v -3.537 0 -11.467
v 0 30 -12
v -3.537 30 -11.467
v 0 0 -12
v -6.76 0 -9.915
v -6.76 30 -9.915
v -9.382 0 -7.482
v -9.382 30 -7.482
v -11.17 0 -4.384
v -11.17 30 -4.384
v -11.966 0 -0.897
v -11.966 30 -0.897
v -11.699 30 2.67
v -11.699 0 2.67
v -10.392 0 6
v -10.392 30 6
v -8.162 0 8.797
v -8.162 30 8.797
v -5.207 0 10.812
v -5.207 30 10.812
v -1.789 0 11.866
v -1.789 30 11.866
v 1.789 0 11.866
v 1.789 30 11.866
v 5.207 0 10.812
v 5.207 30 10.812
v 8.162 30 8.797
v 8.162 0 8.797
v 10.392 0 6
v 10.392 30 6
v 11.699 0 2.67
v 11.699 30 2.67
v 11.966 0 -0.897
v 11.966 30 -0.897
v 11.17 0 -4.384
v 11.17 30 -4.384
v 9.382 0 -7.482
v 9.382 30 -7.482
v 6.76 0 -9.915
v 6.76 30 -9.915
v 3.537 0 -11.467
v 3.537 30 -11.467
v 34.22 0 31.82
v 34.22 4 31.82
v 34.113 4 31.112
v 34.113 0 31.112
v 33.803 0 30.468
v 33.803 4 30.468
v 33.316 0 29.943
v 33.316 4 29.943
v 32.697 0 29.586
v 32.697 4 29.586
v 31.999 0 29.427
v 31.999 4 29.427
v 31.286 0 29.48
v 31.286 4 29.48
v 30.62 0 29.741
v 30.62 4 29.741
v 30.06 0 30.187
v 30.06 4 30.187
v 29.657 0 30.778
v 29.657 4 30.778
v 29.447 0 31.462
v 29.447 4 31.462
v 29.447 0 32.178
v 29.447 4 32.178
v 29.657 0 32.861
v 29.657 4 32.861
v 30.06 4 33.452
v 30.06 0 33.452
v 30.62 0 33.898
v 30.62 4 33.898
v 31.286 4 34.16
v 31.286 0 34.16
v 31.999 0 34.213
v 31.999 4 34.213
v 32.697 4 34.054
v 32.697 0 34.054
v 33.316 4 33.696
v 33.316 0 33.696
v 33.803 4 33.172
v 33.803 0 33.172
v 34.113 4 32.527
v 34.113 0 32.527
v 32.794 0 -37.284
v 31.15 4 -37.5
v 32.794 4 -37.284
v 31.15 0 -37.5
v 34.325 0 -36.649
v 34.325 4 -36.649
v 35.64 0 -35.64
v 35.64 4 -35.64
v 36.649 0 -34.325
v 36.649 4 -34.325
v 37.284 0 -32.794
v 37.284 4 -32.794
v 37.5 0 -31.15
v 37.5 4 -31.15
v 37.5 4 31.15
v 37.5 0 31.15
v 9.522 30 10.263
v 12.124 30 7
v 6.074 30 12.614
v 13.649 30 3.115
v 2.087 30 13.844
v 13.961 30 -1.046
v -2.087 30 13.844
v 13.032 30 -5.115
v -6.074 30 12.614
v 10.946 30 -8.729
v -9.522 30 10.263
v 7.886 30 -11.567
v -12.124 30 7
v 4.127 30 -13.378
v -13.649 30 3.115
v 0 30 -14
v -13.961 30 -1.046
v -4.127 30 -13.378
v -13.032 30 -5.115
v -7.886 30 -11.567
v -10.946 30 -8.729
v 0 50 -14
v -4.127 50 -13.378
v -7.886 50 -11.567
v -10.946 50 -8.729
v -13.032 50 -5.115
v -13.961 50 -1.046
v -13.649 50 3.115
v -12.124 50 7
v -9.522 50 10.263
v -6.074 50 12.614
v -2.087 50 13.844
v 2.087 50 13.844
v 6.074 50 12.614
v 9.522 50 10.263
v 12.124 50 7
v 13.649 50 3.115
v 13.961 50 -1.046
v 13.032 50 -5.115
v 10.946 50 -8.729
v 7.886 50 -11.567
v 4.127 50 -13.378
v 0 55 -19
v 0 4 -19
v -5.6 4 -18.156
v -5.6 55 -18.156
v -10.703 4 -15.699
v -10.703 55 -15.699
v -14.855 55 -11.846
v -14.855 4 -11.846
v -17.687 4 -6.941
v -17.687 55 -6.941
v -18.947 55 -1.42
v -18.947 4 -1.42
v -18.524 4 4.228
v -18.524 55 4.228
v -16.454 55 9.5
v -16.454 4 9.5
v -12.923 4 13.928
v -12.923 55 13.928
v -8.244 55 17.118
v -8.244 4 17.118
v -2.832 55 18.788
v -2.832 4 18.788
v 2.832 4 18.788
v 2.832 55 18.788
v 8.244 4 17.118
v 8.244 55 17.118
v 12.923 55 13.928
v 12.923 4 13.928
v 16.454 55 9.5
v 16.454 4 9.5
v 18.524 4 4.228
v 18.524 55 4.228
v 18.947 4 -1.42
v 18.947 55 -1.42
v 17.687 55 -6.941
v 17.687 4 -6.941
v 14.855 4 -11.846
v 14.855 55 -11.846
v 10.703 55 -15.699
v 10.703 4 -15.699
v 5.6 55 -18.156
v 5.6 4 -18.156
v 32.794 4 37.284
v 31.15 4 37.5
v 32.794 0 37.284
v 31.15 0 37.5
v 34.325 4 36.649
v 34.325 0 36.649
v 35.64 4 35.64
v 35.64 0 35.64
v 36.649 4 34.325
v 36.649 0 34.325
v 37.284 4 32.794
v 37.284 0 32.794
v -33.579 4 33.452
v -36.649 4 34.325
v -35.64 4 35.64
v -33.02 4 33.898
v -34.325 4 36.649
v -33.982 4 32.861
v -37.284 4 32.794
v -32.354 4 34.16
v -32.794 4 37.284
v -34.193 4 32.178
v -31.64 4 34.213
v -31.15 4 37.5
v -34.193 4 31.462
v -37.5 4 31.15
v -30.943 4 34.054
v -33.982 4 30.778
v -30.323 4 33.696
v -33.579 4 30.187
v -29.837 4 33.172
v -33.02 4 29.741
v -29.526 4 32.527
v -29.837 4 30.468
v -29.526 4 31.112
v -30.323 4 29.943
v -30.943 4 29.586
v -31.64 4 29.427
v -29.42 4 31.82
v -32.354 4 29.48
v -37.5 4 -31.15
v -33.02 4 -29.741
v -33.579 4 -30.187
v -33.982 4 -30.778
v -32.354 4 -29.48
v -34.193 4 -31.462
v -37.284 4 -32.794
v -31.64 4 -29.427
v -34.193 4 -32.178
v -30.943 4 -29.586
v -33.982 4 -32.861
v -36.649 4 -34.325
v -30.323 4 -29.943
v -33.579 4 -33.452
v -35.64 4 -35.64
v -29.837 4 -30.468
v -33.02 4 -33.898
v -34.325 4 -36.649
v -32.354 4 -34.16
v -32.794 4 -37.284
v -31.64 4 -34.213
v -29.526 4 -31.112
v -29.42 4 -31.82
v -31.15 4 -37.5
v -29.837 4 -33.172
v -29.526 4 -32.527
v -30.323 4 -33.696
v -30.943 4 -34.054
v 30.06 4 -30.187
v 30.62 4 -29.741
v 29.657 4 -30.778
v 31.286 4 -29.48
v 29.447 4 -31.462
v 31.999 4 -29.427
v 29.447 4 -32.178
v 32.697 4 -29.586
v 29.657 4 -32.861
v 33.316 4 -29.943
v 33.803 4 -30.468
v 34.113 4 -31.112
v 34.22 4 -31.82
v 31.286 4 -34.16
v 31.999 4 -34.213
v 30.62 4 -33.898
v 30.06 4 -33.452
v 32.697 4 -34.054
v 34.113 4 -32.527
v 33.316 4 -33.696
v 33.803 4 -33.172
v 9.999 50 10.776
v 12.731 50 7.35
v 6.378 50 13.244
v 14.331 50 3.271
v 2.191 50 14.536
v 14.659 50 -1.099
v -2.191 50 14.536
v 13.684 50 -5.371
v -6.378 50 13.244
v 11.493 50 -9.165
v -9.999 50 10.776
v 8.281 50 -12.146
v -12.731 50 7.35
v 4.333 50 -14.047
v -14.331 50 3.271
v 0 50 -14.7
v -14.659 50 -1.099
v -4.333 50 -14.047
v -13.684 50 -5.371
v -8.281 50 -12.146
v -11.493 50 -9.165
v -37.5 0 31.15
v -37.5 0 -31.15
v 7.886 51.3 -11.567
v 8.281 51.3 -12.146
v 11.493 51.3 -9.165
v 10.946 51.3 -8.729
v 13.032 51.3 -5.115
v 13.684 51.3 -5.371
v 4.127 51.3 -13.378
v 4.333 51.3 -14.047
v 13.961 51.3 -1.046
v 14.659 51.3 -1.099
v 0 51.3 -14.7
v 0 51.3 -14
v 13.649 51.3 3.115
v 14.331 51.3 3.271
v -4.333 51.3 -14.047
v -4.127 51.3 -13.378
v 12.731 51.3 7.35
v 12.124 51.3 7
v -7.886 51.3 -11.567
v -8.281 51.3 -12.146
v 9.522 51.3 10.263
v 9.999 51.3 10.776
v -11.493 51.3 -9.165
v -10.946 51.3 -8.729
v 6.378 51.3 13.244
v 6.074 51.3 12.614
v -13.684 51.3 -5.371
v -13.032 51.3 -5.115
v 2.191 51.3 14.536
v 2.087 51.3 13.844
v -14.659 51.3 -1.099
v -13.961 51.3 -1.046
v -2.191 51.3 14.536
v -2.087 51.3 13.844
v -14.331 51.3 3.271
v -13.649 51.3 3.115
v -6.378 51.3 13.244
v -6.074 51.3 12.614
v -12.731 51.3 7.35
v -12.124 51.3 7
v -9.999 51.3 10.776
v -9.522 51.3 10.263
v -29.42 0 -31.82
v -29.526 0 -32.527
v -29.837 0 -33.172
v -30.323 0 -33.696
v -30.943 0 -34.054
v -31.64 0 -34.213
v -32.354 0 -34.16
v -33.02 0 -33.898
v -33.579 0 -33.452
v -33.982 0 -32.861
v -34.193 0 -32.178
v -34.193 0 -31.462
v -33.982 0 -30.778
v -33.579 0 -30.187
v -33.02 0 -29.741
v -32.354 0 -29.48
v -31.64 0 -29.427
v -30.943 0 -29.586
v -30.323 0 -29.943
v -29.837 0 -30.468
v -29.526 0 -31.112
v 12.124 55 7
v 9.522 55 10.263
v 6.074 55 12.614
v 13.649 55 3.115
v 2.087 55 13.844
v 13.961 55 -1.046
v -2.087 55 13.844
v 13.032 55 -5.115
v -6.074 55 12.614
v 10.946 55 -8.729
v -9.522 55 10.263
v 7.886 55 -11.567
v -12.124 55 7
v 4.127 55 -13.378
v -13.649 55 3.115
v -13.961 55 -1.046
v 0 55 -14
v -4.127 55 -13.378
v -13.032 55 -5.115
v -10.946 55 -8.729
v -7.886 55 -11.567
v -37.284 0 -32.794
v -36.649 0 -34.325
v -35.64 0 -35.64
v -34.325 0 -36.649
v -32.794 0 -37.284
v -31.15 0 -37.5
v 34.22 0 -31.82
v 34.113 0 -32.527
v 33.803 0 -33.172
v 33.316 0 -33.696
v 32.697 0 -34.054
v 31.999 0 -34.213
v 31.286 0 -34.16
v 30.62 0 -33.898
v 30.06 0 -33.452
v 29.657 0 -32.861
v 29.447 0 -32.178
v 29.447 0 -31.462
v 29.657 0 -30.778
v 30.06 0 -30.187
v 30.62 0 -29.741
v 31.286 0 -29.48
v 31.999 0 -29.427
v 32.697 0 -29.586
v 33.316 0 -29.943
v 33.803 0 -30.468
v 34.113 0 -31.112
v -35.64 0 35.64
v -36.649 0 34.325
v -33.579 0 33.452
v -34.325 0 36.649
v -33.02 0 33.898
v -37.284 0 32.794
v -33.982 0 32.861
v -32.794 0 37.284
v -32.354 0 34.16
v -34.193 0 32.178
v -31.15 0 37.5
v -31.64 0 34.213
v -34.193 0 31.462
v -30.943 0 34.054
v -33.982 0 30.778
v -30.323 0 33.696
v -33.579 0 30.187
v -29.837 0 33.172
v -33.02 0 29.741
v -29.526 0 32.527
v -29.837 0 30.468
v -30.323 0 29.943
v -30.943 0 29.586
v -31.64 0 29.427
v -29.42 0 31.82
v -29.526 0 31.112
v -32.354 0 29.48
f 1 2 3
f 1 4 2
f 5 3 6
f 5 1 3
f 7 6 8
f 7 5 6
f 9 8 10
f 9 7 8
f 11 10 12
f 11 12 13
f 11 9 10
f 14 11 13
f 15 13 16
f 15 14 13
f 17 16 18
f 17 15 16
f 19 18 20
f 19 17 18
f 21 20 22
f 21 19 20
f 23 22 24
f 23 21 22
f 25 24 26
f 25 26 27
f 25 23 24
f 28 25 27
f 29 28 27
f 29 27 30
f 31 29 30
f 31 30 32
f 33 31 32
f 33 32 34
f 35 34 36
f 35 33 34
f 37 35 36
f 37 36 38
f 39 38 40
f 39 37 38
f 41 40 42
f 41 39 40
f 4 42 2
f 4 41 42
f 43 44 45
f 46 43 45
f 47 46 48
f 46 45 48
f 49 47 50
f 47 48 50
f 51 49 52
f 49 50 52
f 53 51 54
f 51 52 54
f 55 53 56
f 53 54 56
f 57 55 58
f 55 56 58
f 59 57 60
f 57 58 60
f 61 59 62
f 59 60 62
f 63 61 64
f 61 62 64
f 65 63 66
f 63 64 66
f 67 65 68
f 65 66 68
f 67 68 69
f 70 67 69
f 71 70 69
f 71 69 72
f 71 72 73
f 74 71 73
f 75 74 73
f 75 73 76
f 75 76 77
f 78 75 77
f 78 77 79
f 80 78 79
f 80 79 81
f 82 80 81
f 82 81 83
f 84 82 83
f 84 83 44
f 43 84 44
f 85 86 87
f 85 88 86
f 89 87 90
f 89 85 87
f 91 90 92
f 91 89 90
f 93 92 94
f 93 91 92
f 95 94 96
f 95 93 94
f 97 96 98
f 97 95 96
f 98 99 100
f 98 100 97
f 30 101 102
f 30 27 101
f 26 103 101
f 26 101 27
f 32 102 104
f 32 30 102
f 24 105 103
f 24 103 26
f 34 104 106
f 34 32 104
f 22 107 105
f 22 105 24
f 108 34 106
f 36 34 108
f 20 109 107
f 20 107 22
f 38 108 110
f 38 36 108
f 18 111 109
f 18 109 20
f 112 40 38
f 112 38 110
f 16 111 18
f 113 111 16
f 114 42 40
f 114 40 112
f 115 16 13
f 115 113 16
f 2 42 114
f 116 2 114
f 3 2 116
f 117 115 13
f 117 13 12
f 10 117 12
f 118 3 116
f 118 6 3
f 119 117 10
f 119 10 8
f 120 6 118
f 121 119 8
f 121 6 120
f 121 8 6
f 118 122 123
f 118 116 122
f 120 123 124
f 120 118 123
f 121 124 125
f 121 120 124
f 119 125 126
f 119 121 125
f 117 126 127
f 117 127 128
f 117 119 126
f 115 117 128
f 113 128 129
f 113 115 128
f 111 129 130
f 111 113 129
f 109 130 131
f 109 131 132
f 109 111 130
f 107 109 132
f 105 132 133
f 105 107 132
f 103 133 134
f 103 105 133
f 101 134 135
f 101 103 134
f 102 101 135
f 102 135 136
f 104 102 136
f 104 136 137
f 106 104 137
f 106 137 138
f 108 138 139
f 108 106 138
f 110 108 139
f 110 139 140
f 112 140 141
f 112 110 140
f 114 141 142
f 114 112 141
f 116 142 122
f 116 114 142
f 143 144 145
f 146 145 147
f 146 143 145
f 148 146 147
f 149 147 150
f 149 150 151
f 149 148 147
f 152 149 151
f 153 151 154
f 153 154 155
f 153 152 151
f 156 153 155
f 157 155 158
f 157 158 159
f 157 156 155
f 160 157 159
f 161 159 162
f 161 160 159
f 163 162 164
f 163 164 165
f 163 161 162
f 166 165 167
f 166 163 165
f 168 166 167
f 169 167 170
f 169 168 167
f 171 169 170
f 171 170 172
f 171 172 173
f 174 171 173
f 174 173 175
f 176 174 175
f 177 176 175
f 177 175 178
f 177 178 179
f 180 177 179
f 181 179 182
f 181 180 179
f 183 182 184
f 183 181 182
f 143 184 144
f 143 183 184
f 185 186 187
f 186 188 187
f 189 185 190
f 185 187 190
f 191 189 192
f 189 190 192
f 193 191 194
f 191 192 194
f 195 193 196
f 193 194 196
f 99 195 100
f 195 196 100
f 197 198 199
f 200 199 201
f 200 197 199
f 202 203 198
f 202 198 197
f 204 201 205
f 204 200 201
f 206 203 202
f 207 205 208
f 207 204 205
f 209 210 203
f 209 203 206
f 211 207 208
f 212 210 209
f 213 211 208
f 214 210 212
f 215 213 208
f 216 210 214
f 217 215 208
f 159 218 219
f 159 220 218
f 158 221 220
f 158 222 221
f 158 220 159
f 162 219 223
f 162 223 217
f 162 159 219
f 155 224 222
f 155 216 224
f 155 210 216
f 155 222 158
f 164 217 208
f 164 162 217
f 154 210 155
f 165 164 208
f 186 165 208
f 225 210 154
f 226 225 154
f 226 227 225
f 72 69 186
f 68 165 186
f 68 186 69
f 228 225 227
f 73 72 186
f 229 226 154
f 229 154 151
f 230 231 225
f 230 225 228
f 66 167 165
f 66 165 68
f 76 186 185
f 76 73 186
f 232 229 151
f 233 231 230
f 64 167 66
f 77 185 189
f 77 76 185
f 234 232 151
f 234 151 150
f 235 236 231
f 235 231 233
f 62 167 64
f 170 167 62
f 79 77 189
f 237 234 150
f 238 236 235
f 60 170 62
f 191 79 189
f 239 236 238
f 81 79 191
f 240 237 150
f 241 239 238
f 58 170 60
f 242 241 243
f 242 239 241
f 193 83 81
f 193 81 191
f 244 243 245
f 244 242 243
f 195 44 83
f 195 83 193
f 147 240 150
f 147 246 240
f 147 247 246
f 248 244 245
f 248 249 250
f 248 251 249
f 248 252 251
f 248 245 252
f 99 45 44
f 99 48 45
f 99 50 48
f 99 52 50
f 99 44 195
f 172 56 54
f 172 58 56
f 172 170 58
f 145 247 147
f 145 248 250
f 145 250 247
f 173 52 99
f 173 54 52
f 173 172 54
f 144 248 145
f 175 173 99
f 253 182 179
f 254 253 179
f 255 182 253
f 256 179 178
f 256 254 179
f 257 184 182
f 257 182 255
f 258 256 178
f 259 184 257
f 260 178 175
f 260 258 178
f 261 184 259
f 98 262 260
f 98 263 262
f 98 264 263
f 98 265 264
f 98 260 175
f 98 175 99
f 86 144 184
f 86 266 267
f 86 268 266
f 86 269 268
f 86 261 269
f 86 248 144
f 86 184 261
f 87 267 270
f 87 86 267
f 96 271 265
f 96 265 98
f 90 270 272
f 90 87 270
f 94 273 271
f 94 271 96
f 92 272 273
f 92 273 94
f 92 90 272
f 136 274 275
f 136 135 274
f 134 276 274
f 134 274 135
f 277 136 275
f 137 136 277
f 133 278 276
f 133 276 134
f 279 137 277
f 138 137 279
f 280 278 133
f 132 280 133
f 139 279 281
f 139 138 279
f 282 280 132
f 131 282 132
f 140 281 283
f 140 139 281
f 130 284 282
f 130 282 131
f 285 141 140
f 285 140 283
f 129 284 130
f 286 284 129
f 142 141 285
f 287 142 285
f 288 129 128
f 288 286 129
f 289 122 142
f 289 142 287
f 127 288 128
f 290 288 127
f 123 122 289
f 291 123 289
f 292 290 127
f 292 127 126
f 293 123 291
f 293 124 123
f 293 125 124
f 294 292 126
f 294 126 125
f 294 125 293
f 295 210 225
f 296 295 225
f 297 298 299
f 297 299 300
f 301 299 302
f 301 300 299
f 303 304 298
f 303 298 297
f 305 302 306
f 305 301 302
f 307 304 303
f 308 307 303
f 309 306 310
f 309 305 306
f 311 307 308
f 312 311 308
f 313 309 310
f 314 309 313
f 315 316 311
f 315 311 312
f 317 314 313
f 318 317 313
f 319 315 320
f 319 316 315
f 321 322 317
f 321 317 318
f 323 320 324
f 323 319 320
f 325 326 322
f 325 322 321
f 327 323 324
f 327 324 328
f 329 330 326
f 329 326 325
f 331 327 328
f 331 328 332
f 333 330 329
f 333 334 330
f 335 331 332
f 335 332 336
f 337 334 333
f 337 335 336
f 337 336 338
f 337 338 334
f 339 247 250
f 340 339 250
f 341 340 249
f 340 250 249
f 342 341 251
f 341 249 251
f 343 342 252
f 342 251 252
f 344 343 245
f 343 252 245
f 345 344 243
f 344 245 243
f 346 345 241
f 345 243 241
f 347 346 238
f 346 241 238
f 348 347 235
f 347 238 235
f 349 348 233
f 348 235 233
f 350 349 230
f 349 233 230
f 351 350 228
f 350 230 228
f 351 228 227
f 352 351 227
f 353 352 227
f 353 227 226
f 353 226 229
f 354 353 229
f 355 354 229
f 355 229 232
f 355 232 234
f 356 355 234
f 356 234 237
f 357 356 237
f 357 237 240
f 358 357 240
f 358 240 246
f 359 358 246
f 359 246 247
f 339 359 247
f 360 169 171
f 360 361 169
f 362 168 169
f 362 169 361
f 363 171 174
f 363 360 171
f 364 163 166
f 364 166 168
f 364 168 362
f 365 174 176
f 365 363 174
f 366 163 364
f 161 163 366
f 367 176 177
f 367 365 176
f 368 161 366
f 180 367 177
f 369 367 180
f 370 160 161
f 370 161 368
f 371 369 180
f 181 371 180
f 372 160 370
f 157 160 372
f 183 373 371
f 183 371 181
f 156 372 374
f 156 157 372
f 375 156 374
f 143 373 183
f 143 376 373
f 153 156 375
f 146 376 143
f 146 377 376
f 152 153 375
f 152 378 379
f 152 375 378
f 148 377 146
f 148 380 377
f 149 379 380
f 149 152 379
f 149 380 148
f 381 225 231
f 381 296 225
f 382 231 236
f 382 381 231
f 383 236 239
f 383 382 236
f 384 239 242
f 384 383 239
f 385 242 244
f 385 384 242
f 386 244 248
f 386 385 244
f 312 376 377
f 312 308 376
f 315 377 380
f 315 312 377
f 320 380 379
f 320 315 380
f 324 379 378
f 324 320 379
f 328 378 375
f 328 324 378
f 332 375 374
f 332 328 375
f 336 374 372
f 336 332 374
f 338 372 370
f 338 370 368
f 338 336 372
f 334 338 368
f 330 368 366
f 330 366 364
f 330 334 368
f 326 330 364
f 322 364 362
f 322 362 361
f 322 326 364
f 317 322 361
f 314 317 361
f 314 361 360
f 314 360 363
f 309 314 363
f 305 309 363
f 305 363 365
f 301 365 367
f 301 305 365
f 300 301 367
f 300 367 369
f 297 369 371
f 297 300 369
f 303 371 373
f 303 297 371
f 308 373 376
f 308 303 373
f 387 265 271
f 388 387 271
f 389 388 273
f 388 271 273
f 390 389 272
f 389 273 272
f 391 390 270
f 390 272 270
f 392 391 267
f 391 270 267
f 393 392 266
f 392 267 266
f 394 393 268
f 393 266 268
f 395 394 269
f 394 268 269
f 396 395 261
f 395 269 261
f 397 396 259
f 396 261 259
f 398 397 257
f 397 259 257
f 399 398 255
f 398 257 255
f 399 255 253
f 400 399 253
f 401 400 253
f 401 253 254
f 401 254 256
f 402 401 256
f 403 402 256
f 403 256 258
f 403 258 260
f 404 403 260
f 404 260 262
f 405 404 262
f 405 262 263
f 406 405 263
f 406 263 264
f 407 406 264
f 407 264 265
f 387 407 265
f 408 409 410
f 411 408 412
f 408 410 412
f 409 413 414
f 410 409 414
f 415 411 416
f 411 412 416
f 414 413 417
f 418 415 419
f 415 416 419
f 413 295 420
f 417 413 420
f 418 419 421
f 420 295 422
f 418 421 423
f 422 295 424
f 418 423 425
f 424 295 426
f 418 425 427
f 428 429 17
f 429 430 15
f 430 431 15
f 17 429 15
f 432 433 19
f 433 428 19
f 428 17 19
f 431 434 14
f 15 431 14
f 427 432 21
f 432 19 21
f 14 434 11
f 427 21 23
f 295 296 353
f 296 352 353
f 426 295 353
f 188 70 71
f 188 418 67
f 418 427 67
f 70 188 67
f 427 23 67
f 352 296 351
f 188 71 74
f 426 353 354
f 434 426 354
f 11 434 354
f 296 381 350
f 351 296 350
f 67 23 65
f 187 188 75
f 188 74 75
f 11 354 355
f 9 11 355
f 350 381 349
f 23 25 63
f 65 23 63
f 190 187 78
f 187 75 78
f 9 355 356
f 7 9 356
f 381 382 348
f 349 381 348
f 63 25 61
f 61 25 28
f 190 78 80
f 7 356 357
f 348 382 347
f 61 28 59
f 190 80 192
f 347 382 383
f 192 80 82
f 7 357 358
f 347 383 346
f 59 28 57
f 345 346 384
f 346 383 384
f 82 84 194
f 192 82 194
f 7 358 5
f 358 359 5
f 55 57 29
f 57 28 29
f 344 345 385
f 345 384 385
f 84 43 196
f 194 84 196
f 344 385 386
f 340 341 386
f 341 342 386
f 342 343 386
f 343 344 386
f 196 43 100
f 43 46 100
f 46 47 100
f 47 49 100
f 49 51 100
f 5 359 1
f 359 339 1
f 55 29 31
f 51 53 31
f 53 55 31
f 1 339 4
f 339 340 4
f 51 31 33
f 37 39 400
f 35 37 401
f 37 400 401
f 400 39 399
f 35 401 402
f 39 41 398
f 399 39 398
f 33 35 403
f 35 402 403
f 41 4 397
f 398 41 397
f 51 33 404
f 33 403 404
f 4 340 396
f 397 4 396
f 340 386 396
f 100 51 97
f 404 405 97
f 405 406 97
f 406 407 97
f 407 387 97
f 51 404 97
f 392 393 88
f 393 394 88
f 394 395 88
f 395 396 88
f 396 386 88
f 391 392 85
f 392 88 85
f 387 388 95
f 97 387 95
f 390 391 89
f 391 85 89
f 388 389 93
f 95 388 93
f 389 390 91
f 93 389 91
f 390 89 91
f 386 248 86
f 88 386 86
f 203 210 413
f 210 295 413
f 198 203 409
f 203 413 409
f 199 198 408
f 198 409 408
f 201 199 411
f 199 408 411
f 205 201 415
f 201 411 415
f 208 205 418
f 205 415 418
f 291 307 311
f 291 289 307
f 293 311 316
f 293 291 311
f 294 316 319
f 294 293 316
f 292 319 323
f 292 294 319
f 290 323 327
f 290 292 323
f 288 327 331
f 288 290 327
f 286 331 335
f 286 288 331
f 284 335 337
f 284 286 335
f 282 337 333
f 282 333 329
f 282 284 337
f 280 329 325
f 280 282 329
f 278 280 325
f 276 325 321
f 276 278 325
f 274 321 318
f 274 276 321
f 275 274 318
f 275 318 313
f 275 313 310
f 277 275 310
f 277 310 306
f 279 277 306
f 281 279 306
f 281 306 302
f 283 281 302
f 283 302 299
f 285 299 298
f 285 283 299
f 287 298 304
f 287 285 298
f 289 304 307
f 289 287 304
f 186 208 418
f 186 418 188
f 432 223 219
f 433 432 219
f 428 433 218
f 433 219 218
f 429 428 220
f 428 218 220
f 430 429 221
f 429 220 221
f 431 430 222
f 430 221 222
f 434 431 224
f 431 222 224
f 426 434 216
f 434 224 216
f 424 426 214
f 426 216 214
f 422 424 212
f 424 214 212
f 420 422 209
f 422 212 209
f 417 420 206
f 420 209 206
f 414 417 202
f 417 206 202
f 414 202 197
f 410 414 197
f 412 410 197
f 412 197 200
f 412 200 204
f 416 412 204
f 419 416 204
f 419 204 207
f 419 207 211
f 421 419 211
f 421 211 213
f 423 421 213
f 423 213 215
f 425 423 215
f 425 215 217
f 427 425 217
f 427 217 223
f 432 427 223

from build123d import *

# Parameters (mm, degrees)
SKETCH2_W                = 75
SKETCH2_H                = 75
SKETCH2_R                = 21
BOSS_EXTRUDE1_DEPTH      = 4
M4_CLEARANCE_HOLE1_D     = 4.8
M4_CLEARANCE_HOLE1_DEPTH = 55
FILLET1_R                = 6.35


with BuildPart() as part:
    # Sketch1 → Revolve1 (revolve)
    with BuildSketch(Plane.XY, mode=Mode.PRIVATE) as revolve1_sk:
        Polygon((-12, 0), (-29, 0), (-29, 4), (-19, 4), (-19, 55), (-14, 55), (-14, 51.3), (-14.7, 51.3), (-14.7, 50), (-14, 50), (-14, 30), (-12, 30), align=None)
    revolve(revolve1_sk.sketch.rotate(Axis((0, 0, 0), (0, 1, 0)), 270), axis=Axis((0, 0, 0), (0, 1, 0)))

    # Sketch2 → Boss-Extrude1 (add)
    with BuildSketch(Plane(origin=(0, 4, 0), x_dir=(1, 0, 0), z_dir=(0, 1, 0))):
        Rectangle(SKETCH2_W, SKETCH2_H)
        Circle(SKETCH2_R, mode=Mode.SUBTRACT)
    extrude(amount=-BOSS_EXTRUDE1_DEPTH)

    # M4 Clearance Hole1
    with Locations(Plane(origin=(0, 0, 0), x_dir=(-1, 0, 0), z_dir=(0, -1, 0))):
        with Locations((0, 0), (-31.819805153, 31.819805153), (31.819805153, 31.819805153), (31.819805153, -31.819805153), (-31.819805153, -31.819805153)):
            Hole(M4_CLEARANCE_HOLE1_D / 2, depth=M4_CLEARANCE_HOLE1_DEPTH)

    # Fillet1
    fillet1_edges = [part.edges().sort_by_distance(p)[0] for p in [
        (37.5, 2, 37.5),
        (37.5, 2, -37.5),
        (-37.5, 2, -37.5),
        (-37.5, 2, 37.5),
    ]]
    fillet(fillet1_edges, radius=FILLET1_R)


solid = part.part
